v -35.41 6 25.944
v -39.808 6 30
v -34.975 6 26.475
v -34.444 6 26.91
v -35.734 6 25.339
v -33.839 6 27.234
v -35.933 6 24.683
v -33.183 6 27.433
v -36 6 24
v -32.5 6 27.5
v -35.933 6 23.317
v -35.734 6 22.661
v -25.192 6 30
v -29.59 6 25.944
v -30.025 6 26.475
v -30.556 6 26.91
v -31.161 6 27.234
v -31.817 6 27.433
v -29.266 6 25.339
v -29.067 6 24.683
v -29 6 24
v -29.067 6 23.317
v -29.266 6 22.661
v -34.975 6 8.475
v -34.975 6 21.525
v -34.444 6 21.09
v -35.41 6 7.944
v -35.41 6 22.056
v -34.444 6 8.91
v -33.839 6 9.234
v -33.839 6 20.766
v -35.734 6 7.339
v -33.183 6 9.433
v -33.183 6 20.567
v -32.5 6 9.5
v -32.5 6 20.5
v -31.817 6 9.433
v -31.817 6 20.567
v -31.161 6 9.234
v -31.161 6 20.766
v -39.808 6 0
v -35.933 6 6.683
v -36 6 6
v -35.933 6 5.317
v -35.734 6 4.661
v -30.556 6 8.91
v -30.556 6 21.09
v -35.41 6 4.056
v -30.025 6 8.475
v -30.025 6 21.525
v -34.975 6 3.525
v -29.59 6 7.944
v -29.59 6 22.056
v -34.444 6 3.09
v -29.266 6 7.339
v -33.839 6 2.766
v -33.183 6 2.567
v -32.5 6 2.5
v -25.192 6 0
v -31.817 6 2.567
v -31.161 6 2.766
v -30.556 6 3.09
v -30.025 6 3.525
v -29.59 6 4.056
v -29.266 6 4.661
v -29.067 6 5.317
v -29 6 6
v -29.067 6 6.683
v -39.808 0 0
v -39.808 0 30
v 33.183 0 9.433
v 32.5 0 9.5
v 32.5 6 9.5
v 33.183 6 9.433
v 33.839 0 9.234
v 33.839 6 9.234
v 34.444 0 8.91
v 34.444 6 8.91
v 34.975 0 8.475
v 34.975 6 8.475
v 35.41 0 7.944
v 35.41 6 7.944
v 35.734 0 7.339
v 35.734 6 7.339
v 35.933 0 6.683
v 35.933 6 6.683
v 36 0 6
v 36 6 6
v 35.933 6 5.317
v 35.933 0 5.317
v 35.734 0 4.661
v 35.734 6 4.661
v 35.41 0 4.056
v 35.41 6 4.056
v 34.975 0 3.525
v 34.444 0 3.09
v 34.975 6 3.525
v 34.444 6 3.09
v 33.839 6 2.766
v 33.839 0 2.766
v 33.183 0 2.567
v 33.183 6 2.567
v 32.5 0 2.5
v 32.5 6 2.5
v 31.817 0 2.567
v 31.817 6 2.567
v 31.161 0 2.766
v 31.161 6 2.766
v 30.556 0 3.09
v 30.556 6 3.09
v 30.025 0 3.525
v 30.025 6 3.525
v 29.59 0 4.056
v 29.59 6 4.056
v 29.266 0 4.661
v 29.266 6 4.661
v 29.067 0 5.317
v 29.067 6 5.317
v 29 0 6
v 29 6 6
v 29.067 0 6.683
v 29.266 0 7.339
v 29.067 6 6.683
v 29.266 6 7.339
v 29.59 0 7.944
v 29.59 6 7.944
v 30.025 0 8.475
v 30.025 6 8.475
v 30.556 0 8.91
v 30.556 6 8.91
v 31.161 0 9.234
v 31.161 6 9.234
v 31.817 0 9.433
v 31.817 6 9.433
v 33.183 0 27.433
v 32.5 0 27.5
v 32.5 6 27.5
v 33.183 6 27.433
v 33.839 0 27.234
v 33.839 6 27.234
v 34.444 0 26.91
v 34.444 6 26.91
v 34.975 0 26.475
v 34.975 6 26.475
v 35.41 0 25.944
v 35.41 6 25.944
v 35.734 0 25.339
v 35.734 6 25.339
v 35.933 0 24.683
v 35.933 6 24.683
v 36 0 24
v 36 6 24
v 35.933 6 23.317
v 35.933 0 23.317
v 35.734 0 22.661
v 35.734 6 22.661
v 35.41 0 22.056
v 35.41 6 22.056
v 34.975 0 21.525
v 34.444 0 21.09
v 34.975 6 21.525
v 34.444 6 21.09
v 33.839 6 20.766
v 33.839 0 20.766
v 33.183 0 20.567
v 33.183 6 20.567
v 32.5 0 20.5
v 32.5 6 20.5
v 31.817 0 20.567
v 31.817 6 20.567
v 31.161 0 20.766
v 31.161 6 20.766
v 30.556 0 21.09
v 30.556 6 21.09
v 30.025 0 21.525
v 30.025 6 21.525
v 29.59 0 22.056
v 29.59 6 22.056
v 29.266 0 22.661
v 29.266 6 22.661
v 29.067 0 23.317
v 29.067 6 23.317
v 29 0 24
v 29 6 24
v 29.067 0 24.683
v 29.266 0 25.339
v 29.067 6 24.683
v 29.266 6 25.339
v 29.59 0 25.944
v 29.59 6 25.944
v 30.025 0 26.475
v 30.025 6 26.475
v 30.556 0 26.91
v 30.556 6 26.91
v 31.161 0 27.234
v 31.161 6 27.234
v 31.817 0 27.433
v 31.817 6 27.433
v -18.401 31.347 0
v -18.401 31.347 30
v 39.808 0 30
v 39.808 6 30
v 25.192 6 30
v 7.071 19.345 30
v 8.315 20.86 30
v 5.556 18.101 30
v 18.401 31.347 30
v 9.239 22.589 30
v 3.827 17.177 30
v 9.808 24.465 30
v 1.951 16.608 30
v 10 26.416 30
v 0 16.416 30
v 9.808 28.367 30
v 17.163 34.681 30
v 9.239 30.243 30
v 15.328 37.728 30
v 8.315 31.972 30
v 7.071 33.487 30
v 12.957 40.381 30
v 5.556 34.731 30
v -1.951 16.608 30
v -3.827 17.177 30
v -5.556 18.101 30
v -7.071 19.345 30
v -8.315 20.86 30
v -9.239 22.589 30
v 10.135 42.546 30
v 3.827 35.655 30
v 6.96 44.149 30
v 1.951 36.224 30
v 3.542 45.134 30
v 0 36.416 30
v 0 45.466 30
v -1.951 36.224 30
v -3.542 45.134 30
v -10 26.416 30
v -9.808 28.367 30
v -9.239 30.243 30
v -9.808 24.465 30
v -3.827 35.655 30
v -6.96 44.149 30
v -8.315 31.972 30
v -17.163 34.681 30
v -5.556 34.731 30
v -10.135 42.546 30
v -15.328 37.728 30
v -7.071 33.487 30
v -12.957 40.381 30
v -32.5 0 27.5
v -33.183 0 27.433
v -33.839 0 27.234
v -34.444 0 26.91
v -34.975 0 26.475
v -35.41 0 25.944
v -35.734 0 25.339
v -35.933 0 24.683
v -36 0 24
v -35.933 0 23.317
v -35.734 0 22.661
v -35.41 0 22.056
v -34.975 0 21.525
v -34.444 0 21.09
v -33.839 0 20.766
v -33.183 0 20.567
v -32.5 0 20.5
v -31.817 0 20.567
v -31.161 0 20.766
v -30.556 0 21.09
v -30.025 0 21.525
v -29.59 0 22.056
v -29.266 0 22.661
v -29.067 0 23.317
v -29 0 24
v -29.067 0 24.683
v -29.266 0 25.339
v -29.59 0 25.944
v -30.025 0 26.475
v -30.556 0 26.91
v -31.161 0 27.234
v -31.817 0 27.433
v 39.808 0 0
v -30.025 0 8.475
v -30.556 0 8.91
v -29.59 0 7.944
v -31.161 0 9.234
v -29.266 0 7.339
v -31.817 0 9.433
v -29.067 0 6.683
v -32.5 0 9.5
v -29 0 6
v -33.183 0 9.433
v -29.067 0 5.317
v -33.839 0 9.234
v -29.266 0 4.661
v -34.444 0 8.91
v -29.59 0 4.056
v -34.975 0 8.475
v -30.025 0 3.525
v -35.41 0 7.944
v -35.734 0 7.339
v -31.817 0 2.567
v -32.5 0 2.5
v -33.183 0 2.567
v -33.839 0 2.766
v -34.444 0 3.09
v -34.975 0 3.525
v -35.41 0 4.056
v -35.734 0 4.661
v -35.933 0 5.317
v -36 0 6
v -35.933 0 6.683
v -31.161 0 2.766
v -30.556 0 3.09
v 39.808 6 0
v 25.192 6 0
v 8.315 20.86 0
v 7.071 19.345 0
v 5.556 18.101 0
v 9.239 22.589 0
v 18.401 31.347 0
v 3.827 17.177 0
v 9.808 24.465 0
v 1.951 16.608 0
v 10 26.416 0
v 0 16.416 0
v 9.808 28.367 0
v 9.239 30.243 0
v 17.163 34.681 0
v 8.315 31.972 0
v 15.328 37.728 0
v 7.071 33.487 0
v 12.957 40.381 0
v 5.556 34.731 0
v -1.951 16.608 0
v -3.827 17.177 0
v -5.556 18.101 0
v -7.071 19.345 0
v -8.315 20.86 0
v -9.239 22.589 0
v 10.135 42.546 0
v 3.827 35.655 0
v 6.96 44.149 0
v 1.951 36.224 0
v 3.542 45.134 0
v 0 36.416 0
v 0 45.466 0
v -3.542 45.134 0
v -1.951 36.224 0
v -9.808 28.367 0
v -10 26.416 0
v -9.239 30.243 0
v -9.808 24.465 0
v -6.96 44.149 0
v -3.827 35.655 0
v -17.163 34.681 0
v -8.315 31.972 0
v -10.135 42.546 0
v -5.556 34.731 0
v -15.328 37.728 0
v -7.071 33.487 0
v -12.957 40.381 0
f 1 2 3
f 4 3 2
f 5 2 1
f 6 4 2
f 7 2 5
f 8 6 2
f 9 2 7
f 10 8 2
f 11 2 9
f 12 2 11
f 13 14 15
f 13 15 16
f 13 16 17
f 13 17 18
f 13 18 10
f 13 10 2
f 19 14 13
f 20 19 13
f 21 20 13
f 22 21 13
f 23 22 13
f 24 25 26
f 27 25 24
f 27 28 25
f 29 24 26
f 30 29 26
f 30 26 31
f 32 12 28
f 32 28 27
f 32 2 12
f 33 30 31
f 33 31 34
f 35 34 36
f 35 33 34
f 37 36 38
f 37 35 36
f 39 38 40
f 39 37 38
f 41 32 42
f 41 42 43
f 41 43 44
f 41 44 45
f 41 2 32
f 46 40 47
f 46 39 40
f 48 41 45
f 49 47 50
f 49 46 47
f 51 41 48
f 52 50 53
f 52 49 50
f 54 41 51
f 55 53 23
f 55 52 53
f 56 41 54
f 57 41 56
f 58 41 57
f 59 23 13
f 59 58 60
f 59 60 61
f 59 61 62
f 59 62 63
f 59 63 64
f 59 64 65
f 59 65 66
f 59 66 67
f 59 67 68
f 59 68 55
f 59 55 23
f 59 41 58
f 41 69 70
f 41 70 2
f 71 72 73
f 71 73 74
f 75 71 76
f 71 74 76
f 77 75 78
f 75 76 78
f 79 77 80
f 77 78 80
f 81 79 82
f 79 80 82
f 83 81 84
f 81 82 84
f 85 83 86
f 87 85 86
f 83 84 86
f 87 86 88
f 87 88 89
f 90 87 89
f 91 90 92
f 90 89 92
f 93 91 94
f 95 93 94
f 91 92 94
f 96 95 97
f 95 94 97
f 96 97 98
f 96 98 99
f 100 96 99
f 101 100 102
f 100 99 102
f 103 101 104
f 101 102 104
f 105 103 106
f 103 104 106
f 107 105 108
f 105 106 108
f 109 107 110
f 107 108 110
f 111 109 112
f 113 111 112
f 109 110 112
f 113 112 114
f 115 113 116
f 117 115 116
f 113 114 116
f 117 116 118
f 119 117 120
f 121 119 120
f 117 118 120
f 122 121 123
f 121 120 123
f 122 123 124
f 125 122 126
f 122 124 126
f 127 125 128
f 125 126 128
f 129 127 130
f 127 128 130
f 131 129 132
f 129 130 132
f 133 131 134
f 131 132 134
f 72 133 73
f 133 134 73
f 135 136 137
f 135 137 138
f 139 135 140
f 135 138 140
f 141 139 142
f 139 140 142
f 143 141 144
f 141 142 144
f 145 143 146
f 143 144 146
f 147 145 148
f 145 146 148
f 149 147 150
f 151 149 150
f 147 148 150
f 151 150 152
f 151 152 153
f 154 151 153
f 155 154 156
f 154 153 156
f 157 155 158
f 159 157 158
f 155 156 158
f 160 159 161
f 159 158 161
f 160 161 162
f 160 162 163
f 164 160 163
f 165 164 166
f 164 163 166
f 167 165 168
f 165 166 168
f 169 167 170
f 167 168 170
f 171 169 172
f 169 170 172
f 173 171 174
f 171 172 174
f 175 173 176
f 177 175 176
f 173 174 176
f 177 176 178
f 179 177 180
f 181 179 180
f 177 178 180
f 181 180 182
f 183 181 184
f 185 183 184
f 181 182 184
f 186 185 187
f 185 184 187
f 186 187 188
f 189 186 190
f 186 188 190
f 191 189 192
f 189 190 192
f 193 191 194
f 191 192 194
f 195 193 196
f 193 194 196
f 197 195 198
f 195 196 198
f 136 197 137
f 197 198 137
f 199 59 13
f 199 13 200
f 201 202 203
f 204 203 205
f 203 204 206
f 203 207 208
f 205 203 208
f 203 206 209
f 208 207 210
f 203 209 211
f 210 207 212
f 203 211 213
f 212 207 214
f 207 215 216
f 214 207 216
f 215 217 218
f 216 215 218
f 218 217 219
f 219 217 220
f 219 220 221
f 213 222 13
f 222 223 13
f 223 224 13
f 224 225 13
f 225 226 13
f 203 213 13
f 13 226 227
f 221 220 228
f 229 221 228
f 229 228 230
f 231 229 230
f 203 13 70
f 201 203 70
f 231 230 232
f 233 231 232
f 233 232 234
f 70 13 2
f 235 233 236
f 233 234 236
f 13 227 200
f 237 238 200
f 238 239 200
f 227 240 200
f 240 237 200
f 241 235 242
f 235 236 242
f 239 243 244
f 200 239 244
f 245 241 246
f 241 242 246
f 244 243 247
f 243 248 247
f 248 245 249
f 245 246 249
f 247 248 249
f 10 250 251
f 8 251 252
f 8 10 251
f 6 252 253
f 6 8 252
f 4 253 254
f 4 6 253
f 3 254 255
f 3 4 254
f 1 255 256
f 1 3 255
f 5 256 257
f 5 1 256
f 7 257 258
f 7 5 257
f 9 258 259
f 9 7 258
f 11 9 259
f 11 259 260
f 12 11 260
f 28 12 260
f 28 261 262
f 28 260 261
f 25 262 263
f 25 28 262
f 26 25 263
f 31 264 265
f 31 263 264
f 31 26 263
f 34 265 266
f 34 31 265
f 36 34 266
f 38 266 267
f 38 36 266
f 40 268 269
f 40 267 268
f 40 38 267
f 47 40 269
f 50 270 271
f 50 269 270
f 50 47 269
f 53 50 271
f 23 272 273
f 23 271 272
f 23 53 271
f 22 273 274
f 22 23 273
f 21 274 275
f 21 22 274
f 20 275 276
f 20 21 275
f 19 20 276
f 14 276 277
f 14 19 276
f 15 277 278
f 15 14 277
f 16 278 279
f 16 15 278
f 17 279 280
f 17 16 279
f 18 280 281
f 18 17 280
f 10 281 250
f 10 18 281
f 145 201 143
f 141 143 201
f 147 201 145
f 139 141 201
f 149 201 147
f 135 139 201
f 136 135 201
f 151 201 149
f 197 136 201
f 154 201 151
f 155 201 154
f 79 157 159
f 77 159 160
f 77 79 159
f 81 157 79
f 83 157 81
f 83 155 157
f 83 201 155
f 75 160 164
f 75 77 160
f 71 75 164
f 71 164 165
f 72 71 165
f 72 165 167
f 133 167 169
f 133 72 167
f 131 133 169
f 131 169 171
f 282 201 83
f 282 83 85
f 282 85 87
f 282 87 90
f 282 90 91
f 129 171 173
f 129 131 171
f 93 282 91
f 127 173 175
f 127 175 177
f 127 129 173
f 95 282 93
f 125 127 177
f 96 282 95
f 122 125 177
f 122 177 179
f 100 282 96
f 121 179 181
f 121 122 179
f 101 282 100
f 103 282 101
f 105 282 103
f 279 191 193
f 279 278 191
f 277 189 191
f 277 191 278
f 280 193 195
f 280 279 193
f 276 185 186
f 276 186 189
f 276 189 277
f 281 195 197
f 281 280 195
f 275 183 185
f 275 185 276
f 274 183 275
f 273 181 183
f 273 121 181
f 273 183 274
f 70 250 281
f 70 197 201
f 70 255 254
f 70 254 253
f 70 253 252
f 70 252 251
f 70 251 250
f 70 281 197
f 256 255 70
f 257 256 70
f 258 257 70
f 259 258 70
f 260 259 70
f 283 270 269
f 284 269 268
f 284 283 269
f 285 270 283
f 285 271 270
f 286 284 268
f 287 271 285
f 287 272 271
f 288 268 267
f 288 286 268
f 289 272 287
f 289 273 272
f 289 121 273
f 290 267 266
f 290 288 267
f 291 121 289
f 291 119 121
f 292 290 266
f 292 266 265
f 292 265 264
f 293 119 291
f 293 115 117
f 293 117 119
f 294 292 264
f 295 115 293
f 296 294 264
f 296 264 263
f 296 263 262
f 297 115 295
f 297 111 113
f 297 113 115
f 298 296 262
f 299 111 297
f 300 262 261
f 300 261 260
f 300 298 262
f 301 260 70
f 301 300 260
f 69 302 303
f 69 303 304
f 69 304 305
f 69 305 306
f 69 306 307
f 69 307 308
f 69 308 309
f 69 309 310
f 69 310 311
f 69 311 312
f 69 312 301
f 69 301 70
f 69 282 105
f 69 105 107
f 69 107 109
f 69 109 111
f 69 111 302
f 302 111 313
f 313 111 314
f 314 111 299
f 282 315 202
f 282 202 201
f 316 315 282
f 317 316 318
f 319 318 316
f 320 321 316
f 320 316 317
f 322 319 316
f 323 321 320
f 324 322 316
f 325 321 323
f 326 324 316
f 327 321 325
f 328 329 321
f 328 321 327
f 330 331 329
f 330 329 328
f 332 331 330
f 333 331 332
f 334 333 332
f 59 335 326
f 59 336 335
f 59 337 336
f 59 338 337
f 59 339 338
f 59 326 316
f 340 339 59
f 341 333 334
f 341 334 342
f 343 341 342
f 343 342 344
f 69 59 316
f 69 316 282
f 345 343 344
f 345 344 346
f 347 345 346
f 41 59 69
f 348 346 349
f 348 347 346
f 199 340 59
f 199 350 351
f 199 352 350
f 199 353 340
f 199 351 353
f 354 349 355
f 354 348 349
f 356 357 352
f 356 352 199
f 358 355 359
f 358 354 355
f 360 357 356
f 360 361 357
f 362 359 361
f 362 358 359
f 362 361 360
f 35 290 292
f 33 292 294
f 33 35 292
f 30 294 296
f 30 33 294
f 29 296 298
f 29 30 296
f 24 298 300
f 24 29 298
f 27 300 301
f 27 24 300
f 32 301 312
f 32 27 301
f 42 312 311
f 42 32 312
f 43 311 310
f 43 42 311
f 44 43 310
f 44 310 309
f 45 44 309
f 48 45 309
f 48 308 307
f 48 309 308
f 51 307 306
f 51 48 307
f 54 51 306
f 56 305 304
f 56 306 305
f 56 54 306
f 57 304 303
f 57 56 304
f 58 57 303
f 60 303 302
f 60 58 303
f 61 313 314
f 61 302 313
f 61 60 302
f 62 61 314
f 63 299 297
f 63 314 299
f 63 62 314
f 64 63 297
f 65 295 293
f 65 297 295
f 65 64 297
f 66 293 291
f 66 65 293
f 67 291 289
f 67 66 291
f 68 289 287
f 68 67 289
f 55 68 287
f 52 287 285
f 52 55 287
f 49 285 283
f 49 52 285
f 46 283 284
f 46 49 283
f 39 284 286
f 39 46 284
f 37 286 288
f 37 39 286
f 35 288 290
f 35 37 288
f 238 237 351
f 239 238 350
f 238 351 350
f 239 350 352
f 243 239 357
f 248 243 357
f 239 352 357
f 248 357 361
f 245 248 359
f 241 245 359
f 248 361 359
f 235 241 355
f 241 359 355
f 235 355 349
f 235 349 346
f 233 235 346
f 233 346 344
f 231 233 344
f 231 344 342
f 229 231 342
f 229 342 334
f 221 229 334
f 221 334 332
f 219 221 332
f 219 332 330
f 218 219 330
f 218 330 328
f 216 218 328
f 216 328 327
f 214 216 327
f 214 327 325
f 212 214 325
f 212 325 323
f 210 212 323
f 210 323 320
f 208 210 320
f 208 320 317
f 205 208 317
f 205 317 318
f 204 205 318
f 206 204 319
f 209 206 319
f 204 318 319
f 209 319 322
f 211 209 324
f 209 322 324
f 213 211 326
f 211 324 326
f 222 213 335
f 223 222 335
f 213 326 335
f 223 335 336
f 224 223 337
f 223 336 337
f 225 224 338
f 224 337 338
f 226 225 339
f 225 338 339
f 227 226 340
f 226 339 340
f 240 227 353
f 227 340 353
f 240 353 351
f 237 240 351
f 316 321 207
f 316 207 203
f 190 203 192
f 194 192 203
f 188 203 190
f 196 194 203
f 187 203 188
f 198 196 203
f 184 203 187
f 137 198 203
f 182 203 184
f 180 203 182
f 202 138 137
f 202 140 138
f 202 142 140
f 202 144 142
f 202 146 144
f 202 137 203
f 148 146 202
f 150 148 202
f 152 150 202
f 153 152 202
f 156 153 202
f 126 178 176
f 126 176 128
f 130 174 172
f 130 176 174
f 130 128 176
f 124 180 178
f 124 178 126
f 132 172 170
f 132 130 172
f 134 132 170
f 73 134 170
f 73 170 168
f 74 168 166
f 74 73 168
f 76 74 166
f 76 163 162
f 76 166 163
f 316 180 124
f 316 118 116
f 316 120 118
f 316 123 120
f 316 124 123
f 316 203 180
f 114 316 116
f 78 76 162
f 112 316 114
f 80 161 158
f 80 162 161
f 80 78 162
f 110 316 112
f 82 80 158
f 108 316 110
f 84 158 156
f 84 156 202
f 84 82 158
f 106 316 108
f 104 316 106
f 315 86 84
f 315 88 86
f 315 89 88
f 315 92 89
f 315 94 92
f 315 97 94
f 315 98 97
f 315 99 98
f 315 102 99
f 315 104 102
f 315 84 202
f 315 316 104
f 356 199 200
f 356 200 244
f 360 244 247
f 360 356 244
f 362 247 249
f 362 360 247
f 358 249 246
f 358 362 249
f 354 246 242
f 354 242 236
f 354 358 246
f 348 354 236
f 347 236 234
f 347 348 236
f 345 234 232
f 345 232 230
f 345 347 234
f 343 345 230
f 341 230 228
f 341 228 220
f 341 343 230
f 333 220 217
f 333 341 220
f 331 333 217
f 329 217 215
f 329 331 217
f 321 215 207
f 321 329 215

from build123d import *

# Parameters (mm, degrees)
BOSS_EXTRUDE1_DEPTH            = 30
F_20_0MM_DOWEL_HOLE1_D         = 20
F_20_0MM_DOWEL_HOLE1_DEPTH     = 74.0791
F_20_0MM_DOWEL_HOLE1_TIP       = 6.00860619
M8X1_0_TAPPED_HOLE1_AT_2_COUNT = 2
M8X1_0_TAPPED_HOLE1_AT_2_PITCH = 18


with BuildPart() as part:
    # Sketch1 → Boss-Extrude1 (new body)
    with BuildSketch(Plane.XY):
        with BuildLine():
            Line((0, 0), (-39.807538051, 0))
            Line((-39.807538051, 0), (-39.807538051, 6))
            Line((-39.807538051, 6), (-25.192461949, 6))
            Line((-25.192461949, 6), (-18.400886991, 31.346502809))
            ThreePointArc((-18.400886991, 31.346502809), (0, 45.466), (18.400886991, 31.346502809))
            Line((18.400886991, 31.346502809), (25.192461949, 6))
            Line((25.192461949, 6), (39.807538051, 6))
            Line((39.807538051, 6), (39.807538051, 0))
            Line((39.807538051, 0), (0, 0))
        make_face()
    extrude(amount=BOSS_EXTRUDE1_DEPTH)

    # Ø20.0mm Dowel Hole1
    with Locations(Plane(origin=(0, 26.416, 30), x_dir=(1, 0, 0), z_dir=(0, 0, 1))):
        with Locations((0, 0)):
            Hole(F_20_0MM_DOWEL_HOLE1_D / 2, depth=F_20_0MM_DOWEL_HOLE1_DEPTH)
            with Locations((0, 0, -(F_20_0MM_DOWEL_HOLE1_DEPTH + F_20_0MM_DOWEL_HOLE1_TIP / 2))):  # 118° drill point
                Cone(0, F_20_0MM_DOWEL_HOLE1_D / 2, F_20_0MM_DOWEL_HOLE1_TIP, mode=Mode.SUBTRACT)

    # Sketch6 → M8x1.0 Tapped Hole1 (revolve, cut)
    with BuildSketch(Plane(origin=(-32.5, 6, 6), x_dir=(0, 0, 1), z_dir=(1, 0, 0))):
        Polygon((0, 0), (0, 21.103012167), (3.5, 19), (3.5, 0), align=None)
    m8x1_0_tapped_hole1 = revolve(axis=Axis((-32.5, 12.35, 6), (0, -1, 0)), mode=Mode.SUBTRACT)

    # M8x1.0 Tapped Hole1 at 2: M8x1.0 Tapped Hole1 ×2
    with Locations(*[(0, 0, i * M8X1_0_TAPPED_HOLE1_AT_2_PITCH) for i in range(1, M8X1_0_TAPPED_HOLE1_AT_2_COUNT)]):
        add(m8x1_0_tapped_hole1, mode=Mode.SUBTRACT)

    # Mirror1: M8x1.0 Tapped Hole1 across plane
    add(m8x1_0_tapped_hole1.mirror(Plane(origin=(0, 0, 0), x_dir=(0, 0, 1), z_dir=(1, 0, 0))), mode=Mode.SUBTRACT)

    # Mirror1 copy 1 sketch → Mirror1 copy 1 (revolve, cut)
    with BuildSketch(Plane(origin=(32.5, 6, 24), x_dir=(0, 0, 1), z_dir=(-1, 0, 0))):
        Polygon((0, 0), (0, -21.103012167), (3.5, -19), (3.5, 0), align=None)
    revolve(axis=Axis((32.5, 12.35, 24), (0, 1, 0)), mode=Mode.SUBTRACT)


solid = part.part
